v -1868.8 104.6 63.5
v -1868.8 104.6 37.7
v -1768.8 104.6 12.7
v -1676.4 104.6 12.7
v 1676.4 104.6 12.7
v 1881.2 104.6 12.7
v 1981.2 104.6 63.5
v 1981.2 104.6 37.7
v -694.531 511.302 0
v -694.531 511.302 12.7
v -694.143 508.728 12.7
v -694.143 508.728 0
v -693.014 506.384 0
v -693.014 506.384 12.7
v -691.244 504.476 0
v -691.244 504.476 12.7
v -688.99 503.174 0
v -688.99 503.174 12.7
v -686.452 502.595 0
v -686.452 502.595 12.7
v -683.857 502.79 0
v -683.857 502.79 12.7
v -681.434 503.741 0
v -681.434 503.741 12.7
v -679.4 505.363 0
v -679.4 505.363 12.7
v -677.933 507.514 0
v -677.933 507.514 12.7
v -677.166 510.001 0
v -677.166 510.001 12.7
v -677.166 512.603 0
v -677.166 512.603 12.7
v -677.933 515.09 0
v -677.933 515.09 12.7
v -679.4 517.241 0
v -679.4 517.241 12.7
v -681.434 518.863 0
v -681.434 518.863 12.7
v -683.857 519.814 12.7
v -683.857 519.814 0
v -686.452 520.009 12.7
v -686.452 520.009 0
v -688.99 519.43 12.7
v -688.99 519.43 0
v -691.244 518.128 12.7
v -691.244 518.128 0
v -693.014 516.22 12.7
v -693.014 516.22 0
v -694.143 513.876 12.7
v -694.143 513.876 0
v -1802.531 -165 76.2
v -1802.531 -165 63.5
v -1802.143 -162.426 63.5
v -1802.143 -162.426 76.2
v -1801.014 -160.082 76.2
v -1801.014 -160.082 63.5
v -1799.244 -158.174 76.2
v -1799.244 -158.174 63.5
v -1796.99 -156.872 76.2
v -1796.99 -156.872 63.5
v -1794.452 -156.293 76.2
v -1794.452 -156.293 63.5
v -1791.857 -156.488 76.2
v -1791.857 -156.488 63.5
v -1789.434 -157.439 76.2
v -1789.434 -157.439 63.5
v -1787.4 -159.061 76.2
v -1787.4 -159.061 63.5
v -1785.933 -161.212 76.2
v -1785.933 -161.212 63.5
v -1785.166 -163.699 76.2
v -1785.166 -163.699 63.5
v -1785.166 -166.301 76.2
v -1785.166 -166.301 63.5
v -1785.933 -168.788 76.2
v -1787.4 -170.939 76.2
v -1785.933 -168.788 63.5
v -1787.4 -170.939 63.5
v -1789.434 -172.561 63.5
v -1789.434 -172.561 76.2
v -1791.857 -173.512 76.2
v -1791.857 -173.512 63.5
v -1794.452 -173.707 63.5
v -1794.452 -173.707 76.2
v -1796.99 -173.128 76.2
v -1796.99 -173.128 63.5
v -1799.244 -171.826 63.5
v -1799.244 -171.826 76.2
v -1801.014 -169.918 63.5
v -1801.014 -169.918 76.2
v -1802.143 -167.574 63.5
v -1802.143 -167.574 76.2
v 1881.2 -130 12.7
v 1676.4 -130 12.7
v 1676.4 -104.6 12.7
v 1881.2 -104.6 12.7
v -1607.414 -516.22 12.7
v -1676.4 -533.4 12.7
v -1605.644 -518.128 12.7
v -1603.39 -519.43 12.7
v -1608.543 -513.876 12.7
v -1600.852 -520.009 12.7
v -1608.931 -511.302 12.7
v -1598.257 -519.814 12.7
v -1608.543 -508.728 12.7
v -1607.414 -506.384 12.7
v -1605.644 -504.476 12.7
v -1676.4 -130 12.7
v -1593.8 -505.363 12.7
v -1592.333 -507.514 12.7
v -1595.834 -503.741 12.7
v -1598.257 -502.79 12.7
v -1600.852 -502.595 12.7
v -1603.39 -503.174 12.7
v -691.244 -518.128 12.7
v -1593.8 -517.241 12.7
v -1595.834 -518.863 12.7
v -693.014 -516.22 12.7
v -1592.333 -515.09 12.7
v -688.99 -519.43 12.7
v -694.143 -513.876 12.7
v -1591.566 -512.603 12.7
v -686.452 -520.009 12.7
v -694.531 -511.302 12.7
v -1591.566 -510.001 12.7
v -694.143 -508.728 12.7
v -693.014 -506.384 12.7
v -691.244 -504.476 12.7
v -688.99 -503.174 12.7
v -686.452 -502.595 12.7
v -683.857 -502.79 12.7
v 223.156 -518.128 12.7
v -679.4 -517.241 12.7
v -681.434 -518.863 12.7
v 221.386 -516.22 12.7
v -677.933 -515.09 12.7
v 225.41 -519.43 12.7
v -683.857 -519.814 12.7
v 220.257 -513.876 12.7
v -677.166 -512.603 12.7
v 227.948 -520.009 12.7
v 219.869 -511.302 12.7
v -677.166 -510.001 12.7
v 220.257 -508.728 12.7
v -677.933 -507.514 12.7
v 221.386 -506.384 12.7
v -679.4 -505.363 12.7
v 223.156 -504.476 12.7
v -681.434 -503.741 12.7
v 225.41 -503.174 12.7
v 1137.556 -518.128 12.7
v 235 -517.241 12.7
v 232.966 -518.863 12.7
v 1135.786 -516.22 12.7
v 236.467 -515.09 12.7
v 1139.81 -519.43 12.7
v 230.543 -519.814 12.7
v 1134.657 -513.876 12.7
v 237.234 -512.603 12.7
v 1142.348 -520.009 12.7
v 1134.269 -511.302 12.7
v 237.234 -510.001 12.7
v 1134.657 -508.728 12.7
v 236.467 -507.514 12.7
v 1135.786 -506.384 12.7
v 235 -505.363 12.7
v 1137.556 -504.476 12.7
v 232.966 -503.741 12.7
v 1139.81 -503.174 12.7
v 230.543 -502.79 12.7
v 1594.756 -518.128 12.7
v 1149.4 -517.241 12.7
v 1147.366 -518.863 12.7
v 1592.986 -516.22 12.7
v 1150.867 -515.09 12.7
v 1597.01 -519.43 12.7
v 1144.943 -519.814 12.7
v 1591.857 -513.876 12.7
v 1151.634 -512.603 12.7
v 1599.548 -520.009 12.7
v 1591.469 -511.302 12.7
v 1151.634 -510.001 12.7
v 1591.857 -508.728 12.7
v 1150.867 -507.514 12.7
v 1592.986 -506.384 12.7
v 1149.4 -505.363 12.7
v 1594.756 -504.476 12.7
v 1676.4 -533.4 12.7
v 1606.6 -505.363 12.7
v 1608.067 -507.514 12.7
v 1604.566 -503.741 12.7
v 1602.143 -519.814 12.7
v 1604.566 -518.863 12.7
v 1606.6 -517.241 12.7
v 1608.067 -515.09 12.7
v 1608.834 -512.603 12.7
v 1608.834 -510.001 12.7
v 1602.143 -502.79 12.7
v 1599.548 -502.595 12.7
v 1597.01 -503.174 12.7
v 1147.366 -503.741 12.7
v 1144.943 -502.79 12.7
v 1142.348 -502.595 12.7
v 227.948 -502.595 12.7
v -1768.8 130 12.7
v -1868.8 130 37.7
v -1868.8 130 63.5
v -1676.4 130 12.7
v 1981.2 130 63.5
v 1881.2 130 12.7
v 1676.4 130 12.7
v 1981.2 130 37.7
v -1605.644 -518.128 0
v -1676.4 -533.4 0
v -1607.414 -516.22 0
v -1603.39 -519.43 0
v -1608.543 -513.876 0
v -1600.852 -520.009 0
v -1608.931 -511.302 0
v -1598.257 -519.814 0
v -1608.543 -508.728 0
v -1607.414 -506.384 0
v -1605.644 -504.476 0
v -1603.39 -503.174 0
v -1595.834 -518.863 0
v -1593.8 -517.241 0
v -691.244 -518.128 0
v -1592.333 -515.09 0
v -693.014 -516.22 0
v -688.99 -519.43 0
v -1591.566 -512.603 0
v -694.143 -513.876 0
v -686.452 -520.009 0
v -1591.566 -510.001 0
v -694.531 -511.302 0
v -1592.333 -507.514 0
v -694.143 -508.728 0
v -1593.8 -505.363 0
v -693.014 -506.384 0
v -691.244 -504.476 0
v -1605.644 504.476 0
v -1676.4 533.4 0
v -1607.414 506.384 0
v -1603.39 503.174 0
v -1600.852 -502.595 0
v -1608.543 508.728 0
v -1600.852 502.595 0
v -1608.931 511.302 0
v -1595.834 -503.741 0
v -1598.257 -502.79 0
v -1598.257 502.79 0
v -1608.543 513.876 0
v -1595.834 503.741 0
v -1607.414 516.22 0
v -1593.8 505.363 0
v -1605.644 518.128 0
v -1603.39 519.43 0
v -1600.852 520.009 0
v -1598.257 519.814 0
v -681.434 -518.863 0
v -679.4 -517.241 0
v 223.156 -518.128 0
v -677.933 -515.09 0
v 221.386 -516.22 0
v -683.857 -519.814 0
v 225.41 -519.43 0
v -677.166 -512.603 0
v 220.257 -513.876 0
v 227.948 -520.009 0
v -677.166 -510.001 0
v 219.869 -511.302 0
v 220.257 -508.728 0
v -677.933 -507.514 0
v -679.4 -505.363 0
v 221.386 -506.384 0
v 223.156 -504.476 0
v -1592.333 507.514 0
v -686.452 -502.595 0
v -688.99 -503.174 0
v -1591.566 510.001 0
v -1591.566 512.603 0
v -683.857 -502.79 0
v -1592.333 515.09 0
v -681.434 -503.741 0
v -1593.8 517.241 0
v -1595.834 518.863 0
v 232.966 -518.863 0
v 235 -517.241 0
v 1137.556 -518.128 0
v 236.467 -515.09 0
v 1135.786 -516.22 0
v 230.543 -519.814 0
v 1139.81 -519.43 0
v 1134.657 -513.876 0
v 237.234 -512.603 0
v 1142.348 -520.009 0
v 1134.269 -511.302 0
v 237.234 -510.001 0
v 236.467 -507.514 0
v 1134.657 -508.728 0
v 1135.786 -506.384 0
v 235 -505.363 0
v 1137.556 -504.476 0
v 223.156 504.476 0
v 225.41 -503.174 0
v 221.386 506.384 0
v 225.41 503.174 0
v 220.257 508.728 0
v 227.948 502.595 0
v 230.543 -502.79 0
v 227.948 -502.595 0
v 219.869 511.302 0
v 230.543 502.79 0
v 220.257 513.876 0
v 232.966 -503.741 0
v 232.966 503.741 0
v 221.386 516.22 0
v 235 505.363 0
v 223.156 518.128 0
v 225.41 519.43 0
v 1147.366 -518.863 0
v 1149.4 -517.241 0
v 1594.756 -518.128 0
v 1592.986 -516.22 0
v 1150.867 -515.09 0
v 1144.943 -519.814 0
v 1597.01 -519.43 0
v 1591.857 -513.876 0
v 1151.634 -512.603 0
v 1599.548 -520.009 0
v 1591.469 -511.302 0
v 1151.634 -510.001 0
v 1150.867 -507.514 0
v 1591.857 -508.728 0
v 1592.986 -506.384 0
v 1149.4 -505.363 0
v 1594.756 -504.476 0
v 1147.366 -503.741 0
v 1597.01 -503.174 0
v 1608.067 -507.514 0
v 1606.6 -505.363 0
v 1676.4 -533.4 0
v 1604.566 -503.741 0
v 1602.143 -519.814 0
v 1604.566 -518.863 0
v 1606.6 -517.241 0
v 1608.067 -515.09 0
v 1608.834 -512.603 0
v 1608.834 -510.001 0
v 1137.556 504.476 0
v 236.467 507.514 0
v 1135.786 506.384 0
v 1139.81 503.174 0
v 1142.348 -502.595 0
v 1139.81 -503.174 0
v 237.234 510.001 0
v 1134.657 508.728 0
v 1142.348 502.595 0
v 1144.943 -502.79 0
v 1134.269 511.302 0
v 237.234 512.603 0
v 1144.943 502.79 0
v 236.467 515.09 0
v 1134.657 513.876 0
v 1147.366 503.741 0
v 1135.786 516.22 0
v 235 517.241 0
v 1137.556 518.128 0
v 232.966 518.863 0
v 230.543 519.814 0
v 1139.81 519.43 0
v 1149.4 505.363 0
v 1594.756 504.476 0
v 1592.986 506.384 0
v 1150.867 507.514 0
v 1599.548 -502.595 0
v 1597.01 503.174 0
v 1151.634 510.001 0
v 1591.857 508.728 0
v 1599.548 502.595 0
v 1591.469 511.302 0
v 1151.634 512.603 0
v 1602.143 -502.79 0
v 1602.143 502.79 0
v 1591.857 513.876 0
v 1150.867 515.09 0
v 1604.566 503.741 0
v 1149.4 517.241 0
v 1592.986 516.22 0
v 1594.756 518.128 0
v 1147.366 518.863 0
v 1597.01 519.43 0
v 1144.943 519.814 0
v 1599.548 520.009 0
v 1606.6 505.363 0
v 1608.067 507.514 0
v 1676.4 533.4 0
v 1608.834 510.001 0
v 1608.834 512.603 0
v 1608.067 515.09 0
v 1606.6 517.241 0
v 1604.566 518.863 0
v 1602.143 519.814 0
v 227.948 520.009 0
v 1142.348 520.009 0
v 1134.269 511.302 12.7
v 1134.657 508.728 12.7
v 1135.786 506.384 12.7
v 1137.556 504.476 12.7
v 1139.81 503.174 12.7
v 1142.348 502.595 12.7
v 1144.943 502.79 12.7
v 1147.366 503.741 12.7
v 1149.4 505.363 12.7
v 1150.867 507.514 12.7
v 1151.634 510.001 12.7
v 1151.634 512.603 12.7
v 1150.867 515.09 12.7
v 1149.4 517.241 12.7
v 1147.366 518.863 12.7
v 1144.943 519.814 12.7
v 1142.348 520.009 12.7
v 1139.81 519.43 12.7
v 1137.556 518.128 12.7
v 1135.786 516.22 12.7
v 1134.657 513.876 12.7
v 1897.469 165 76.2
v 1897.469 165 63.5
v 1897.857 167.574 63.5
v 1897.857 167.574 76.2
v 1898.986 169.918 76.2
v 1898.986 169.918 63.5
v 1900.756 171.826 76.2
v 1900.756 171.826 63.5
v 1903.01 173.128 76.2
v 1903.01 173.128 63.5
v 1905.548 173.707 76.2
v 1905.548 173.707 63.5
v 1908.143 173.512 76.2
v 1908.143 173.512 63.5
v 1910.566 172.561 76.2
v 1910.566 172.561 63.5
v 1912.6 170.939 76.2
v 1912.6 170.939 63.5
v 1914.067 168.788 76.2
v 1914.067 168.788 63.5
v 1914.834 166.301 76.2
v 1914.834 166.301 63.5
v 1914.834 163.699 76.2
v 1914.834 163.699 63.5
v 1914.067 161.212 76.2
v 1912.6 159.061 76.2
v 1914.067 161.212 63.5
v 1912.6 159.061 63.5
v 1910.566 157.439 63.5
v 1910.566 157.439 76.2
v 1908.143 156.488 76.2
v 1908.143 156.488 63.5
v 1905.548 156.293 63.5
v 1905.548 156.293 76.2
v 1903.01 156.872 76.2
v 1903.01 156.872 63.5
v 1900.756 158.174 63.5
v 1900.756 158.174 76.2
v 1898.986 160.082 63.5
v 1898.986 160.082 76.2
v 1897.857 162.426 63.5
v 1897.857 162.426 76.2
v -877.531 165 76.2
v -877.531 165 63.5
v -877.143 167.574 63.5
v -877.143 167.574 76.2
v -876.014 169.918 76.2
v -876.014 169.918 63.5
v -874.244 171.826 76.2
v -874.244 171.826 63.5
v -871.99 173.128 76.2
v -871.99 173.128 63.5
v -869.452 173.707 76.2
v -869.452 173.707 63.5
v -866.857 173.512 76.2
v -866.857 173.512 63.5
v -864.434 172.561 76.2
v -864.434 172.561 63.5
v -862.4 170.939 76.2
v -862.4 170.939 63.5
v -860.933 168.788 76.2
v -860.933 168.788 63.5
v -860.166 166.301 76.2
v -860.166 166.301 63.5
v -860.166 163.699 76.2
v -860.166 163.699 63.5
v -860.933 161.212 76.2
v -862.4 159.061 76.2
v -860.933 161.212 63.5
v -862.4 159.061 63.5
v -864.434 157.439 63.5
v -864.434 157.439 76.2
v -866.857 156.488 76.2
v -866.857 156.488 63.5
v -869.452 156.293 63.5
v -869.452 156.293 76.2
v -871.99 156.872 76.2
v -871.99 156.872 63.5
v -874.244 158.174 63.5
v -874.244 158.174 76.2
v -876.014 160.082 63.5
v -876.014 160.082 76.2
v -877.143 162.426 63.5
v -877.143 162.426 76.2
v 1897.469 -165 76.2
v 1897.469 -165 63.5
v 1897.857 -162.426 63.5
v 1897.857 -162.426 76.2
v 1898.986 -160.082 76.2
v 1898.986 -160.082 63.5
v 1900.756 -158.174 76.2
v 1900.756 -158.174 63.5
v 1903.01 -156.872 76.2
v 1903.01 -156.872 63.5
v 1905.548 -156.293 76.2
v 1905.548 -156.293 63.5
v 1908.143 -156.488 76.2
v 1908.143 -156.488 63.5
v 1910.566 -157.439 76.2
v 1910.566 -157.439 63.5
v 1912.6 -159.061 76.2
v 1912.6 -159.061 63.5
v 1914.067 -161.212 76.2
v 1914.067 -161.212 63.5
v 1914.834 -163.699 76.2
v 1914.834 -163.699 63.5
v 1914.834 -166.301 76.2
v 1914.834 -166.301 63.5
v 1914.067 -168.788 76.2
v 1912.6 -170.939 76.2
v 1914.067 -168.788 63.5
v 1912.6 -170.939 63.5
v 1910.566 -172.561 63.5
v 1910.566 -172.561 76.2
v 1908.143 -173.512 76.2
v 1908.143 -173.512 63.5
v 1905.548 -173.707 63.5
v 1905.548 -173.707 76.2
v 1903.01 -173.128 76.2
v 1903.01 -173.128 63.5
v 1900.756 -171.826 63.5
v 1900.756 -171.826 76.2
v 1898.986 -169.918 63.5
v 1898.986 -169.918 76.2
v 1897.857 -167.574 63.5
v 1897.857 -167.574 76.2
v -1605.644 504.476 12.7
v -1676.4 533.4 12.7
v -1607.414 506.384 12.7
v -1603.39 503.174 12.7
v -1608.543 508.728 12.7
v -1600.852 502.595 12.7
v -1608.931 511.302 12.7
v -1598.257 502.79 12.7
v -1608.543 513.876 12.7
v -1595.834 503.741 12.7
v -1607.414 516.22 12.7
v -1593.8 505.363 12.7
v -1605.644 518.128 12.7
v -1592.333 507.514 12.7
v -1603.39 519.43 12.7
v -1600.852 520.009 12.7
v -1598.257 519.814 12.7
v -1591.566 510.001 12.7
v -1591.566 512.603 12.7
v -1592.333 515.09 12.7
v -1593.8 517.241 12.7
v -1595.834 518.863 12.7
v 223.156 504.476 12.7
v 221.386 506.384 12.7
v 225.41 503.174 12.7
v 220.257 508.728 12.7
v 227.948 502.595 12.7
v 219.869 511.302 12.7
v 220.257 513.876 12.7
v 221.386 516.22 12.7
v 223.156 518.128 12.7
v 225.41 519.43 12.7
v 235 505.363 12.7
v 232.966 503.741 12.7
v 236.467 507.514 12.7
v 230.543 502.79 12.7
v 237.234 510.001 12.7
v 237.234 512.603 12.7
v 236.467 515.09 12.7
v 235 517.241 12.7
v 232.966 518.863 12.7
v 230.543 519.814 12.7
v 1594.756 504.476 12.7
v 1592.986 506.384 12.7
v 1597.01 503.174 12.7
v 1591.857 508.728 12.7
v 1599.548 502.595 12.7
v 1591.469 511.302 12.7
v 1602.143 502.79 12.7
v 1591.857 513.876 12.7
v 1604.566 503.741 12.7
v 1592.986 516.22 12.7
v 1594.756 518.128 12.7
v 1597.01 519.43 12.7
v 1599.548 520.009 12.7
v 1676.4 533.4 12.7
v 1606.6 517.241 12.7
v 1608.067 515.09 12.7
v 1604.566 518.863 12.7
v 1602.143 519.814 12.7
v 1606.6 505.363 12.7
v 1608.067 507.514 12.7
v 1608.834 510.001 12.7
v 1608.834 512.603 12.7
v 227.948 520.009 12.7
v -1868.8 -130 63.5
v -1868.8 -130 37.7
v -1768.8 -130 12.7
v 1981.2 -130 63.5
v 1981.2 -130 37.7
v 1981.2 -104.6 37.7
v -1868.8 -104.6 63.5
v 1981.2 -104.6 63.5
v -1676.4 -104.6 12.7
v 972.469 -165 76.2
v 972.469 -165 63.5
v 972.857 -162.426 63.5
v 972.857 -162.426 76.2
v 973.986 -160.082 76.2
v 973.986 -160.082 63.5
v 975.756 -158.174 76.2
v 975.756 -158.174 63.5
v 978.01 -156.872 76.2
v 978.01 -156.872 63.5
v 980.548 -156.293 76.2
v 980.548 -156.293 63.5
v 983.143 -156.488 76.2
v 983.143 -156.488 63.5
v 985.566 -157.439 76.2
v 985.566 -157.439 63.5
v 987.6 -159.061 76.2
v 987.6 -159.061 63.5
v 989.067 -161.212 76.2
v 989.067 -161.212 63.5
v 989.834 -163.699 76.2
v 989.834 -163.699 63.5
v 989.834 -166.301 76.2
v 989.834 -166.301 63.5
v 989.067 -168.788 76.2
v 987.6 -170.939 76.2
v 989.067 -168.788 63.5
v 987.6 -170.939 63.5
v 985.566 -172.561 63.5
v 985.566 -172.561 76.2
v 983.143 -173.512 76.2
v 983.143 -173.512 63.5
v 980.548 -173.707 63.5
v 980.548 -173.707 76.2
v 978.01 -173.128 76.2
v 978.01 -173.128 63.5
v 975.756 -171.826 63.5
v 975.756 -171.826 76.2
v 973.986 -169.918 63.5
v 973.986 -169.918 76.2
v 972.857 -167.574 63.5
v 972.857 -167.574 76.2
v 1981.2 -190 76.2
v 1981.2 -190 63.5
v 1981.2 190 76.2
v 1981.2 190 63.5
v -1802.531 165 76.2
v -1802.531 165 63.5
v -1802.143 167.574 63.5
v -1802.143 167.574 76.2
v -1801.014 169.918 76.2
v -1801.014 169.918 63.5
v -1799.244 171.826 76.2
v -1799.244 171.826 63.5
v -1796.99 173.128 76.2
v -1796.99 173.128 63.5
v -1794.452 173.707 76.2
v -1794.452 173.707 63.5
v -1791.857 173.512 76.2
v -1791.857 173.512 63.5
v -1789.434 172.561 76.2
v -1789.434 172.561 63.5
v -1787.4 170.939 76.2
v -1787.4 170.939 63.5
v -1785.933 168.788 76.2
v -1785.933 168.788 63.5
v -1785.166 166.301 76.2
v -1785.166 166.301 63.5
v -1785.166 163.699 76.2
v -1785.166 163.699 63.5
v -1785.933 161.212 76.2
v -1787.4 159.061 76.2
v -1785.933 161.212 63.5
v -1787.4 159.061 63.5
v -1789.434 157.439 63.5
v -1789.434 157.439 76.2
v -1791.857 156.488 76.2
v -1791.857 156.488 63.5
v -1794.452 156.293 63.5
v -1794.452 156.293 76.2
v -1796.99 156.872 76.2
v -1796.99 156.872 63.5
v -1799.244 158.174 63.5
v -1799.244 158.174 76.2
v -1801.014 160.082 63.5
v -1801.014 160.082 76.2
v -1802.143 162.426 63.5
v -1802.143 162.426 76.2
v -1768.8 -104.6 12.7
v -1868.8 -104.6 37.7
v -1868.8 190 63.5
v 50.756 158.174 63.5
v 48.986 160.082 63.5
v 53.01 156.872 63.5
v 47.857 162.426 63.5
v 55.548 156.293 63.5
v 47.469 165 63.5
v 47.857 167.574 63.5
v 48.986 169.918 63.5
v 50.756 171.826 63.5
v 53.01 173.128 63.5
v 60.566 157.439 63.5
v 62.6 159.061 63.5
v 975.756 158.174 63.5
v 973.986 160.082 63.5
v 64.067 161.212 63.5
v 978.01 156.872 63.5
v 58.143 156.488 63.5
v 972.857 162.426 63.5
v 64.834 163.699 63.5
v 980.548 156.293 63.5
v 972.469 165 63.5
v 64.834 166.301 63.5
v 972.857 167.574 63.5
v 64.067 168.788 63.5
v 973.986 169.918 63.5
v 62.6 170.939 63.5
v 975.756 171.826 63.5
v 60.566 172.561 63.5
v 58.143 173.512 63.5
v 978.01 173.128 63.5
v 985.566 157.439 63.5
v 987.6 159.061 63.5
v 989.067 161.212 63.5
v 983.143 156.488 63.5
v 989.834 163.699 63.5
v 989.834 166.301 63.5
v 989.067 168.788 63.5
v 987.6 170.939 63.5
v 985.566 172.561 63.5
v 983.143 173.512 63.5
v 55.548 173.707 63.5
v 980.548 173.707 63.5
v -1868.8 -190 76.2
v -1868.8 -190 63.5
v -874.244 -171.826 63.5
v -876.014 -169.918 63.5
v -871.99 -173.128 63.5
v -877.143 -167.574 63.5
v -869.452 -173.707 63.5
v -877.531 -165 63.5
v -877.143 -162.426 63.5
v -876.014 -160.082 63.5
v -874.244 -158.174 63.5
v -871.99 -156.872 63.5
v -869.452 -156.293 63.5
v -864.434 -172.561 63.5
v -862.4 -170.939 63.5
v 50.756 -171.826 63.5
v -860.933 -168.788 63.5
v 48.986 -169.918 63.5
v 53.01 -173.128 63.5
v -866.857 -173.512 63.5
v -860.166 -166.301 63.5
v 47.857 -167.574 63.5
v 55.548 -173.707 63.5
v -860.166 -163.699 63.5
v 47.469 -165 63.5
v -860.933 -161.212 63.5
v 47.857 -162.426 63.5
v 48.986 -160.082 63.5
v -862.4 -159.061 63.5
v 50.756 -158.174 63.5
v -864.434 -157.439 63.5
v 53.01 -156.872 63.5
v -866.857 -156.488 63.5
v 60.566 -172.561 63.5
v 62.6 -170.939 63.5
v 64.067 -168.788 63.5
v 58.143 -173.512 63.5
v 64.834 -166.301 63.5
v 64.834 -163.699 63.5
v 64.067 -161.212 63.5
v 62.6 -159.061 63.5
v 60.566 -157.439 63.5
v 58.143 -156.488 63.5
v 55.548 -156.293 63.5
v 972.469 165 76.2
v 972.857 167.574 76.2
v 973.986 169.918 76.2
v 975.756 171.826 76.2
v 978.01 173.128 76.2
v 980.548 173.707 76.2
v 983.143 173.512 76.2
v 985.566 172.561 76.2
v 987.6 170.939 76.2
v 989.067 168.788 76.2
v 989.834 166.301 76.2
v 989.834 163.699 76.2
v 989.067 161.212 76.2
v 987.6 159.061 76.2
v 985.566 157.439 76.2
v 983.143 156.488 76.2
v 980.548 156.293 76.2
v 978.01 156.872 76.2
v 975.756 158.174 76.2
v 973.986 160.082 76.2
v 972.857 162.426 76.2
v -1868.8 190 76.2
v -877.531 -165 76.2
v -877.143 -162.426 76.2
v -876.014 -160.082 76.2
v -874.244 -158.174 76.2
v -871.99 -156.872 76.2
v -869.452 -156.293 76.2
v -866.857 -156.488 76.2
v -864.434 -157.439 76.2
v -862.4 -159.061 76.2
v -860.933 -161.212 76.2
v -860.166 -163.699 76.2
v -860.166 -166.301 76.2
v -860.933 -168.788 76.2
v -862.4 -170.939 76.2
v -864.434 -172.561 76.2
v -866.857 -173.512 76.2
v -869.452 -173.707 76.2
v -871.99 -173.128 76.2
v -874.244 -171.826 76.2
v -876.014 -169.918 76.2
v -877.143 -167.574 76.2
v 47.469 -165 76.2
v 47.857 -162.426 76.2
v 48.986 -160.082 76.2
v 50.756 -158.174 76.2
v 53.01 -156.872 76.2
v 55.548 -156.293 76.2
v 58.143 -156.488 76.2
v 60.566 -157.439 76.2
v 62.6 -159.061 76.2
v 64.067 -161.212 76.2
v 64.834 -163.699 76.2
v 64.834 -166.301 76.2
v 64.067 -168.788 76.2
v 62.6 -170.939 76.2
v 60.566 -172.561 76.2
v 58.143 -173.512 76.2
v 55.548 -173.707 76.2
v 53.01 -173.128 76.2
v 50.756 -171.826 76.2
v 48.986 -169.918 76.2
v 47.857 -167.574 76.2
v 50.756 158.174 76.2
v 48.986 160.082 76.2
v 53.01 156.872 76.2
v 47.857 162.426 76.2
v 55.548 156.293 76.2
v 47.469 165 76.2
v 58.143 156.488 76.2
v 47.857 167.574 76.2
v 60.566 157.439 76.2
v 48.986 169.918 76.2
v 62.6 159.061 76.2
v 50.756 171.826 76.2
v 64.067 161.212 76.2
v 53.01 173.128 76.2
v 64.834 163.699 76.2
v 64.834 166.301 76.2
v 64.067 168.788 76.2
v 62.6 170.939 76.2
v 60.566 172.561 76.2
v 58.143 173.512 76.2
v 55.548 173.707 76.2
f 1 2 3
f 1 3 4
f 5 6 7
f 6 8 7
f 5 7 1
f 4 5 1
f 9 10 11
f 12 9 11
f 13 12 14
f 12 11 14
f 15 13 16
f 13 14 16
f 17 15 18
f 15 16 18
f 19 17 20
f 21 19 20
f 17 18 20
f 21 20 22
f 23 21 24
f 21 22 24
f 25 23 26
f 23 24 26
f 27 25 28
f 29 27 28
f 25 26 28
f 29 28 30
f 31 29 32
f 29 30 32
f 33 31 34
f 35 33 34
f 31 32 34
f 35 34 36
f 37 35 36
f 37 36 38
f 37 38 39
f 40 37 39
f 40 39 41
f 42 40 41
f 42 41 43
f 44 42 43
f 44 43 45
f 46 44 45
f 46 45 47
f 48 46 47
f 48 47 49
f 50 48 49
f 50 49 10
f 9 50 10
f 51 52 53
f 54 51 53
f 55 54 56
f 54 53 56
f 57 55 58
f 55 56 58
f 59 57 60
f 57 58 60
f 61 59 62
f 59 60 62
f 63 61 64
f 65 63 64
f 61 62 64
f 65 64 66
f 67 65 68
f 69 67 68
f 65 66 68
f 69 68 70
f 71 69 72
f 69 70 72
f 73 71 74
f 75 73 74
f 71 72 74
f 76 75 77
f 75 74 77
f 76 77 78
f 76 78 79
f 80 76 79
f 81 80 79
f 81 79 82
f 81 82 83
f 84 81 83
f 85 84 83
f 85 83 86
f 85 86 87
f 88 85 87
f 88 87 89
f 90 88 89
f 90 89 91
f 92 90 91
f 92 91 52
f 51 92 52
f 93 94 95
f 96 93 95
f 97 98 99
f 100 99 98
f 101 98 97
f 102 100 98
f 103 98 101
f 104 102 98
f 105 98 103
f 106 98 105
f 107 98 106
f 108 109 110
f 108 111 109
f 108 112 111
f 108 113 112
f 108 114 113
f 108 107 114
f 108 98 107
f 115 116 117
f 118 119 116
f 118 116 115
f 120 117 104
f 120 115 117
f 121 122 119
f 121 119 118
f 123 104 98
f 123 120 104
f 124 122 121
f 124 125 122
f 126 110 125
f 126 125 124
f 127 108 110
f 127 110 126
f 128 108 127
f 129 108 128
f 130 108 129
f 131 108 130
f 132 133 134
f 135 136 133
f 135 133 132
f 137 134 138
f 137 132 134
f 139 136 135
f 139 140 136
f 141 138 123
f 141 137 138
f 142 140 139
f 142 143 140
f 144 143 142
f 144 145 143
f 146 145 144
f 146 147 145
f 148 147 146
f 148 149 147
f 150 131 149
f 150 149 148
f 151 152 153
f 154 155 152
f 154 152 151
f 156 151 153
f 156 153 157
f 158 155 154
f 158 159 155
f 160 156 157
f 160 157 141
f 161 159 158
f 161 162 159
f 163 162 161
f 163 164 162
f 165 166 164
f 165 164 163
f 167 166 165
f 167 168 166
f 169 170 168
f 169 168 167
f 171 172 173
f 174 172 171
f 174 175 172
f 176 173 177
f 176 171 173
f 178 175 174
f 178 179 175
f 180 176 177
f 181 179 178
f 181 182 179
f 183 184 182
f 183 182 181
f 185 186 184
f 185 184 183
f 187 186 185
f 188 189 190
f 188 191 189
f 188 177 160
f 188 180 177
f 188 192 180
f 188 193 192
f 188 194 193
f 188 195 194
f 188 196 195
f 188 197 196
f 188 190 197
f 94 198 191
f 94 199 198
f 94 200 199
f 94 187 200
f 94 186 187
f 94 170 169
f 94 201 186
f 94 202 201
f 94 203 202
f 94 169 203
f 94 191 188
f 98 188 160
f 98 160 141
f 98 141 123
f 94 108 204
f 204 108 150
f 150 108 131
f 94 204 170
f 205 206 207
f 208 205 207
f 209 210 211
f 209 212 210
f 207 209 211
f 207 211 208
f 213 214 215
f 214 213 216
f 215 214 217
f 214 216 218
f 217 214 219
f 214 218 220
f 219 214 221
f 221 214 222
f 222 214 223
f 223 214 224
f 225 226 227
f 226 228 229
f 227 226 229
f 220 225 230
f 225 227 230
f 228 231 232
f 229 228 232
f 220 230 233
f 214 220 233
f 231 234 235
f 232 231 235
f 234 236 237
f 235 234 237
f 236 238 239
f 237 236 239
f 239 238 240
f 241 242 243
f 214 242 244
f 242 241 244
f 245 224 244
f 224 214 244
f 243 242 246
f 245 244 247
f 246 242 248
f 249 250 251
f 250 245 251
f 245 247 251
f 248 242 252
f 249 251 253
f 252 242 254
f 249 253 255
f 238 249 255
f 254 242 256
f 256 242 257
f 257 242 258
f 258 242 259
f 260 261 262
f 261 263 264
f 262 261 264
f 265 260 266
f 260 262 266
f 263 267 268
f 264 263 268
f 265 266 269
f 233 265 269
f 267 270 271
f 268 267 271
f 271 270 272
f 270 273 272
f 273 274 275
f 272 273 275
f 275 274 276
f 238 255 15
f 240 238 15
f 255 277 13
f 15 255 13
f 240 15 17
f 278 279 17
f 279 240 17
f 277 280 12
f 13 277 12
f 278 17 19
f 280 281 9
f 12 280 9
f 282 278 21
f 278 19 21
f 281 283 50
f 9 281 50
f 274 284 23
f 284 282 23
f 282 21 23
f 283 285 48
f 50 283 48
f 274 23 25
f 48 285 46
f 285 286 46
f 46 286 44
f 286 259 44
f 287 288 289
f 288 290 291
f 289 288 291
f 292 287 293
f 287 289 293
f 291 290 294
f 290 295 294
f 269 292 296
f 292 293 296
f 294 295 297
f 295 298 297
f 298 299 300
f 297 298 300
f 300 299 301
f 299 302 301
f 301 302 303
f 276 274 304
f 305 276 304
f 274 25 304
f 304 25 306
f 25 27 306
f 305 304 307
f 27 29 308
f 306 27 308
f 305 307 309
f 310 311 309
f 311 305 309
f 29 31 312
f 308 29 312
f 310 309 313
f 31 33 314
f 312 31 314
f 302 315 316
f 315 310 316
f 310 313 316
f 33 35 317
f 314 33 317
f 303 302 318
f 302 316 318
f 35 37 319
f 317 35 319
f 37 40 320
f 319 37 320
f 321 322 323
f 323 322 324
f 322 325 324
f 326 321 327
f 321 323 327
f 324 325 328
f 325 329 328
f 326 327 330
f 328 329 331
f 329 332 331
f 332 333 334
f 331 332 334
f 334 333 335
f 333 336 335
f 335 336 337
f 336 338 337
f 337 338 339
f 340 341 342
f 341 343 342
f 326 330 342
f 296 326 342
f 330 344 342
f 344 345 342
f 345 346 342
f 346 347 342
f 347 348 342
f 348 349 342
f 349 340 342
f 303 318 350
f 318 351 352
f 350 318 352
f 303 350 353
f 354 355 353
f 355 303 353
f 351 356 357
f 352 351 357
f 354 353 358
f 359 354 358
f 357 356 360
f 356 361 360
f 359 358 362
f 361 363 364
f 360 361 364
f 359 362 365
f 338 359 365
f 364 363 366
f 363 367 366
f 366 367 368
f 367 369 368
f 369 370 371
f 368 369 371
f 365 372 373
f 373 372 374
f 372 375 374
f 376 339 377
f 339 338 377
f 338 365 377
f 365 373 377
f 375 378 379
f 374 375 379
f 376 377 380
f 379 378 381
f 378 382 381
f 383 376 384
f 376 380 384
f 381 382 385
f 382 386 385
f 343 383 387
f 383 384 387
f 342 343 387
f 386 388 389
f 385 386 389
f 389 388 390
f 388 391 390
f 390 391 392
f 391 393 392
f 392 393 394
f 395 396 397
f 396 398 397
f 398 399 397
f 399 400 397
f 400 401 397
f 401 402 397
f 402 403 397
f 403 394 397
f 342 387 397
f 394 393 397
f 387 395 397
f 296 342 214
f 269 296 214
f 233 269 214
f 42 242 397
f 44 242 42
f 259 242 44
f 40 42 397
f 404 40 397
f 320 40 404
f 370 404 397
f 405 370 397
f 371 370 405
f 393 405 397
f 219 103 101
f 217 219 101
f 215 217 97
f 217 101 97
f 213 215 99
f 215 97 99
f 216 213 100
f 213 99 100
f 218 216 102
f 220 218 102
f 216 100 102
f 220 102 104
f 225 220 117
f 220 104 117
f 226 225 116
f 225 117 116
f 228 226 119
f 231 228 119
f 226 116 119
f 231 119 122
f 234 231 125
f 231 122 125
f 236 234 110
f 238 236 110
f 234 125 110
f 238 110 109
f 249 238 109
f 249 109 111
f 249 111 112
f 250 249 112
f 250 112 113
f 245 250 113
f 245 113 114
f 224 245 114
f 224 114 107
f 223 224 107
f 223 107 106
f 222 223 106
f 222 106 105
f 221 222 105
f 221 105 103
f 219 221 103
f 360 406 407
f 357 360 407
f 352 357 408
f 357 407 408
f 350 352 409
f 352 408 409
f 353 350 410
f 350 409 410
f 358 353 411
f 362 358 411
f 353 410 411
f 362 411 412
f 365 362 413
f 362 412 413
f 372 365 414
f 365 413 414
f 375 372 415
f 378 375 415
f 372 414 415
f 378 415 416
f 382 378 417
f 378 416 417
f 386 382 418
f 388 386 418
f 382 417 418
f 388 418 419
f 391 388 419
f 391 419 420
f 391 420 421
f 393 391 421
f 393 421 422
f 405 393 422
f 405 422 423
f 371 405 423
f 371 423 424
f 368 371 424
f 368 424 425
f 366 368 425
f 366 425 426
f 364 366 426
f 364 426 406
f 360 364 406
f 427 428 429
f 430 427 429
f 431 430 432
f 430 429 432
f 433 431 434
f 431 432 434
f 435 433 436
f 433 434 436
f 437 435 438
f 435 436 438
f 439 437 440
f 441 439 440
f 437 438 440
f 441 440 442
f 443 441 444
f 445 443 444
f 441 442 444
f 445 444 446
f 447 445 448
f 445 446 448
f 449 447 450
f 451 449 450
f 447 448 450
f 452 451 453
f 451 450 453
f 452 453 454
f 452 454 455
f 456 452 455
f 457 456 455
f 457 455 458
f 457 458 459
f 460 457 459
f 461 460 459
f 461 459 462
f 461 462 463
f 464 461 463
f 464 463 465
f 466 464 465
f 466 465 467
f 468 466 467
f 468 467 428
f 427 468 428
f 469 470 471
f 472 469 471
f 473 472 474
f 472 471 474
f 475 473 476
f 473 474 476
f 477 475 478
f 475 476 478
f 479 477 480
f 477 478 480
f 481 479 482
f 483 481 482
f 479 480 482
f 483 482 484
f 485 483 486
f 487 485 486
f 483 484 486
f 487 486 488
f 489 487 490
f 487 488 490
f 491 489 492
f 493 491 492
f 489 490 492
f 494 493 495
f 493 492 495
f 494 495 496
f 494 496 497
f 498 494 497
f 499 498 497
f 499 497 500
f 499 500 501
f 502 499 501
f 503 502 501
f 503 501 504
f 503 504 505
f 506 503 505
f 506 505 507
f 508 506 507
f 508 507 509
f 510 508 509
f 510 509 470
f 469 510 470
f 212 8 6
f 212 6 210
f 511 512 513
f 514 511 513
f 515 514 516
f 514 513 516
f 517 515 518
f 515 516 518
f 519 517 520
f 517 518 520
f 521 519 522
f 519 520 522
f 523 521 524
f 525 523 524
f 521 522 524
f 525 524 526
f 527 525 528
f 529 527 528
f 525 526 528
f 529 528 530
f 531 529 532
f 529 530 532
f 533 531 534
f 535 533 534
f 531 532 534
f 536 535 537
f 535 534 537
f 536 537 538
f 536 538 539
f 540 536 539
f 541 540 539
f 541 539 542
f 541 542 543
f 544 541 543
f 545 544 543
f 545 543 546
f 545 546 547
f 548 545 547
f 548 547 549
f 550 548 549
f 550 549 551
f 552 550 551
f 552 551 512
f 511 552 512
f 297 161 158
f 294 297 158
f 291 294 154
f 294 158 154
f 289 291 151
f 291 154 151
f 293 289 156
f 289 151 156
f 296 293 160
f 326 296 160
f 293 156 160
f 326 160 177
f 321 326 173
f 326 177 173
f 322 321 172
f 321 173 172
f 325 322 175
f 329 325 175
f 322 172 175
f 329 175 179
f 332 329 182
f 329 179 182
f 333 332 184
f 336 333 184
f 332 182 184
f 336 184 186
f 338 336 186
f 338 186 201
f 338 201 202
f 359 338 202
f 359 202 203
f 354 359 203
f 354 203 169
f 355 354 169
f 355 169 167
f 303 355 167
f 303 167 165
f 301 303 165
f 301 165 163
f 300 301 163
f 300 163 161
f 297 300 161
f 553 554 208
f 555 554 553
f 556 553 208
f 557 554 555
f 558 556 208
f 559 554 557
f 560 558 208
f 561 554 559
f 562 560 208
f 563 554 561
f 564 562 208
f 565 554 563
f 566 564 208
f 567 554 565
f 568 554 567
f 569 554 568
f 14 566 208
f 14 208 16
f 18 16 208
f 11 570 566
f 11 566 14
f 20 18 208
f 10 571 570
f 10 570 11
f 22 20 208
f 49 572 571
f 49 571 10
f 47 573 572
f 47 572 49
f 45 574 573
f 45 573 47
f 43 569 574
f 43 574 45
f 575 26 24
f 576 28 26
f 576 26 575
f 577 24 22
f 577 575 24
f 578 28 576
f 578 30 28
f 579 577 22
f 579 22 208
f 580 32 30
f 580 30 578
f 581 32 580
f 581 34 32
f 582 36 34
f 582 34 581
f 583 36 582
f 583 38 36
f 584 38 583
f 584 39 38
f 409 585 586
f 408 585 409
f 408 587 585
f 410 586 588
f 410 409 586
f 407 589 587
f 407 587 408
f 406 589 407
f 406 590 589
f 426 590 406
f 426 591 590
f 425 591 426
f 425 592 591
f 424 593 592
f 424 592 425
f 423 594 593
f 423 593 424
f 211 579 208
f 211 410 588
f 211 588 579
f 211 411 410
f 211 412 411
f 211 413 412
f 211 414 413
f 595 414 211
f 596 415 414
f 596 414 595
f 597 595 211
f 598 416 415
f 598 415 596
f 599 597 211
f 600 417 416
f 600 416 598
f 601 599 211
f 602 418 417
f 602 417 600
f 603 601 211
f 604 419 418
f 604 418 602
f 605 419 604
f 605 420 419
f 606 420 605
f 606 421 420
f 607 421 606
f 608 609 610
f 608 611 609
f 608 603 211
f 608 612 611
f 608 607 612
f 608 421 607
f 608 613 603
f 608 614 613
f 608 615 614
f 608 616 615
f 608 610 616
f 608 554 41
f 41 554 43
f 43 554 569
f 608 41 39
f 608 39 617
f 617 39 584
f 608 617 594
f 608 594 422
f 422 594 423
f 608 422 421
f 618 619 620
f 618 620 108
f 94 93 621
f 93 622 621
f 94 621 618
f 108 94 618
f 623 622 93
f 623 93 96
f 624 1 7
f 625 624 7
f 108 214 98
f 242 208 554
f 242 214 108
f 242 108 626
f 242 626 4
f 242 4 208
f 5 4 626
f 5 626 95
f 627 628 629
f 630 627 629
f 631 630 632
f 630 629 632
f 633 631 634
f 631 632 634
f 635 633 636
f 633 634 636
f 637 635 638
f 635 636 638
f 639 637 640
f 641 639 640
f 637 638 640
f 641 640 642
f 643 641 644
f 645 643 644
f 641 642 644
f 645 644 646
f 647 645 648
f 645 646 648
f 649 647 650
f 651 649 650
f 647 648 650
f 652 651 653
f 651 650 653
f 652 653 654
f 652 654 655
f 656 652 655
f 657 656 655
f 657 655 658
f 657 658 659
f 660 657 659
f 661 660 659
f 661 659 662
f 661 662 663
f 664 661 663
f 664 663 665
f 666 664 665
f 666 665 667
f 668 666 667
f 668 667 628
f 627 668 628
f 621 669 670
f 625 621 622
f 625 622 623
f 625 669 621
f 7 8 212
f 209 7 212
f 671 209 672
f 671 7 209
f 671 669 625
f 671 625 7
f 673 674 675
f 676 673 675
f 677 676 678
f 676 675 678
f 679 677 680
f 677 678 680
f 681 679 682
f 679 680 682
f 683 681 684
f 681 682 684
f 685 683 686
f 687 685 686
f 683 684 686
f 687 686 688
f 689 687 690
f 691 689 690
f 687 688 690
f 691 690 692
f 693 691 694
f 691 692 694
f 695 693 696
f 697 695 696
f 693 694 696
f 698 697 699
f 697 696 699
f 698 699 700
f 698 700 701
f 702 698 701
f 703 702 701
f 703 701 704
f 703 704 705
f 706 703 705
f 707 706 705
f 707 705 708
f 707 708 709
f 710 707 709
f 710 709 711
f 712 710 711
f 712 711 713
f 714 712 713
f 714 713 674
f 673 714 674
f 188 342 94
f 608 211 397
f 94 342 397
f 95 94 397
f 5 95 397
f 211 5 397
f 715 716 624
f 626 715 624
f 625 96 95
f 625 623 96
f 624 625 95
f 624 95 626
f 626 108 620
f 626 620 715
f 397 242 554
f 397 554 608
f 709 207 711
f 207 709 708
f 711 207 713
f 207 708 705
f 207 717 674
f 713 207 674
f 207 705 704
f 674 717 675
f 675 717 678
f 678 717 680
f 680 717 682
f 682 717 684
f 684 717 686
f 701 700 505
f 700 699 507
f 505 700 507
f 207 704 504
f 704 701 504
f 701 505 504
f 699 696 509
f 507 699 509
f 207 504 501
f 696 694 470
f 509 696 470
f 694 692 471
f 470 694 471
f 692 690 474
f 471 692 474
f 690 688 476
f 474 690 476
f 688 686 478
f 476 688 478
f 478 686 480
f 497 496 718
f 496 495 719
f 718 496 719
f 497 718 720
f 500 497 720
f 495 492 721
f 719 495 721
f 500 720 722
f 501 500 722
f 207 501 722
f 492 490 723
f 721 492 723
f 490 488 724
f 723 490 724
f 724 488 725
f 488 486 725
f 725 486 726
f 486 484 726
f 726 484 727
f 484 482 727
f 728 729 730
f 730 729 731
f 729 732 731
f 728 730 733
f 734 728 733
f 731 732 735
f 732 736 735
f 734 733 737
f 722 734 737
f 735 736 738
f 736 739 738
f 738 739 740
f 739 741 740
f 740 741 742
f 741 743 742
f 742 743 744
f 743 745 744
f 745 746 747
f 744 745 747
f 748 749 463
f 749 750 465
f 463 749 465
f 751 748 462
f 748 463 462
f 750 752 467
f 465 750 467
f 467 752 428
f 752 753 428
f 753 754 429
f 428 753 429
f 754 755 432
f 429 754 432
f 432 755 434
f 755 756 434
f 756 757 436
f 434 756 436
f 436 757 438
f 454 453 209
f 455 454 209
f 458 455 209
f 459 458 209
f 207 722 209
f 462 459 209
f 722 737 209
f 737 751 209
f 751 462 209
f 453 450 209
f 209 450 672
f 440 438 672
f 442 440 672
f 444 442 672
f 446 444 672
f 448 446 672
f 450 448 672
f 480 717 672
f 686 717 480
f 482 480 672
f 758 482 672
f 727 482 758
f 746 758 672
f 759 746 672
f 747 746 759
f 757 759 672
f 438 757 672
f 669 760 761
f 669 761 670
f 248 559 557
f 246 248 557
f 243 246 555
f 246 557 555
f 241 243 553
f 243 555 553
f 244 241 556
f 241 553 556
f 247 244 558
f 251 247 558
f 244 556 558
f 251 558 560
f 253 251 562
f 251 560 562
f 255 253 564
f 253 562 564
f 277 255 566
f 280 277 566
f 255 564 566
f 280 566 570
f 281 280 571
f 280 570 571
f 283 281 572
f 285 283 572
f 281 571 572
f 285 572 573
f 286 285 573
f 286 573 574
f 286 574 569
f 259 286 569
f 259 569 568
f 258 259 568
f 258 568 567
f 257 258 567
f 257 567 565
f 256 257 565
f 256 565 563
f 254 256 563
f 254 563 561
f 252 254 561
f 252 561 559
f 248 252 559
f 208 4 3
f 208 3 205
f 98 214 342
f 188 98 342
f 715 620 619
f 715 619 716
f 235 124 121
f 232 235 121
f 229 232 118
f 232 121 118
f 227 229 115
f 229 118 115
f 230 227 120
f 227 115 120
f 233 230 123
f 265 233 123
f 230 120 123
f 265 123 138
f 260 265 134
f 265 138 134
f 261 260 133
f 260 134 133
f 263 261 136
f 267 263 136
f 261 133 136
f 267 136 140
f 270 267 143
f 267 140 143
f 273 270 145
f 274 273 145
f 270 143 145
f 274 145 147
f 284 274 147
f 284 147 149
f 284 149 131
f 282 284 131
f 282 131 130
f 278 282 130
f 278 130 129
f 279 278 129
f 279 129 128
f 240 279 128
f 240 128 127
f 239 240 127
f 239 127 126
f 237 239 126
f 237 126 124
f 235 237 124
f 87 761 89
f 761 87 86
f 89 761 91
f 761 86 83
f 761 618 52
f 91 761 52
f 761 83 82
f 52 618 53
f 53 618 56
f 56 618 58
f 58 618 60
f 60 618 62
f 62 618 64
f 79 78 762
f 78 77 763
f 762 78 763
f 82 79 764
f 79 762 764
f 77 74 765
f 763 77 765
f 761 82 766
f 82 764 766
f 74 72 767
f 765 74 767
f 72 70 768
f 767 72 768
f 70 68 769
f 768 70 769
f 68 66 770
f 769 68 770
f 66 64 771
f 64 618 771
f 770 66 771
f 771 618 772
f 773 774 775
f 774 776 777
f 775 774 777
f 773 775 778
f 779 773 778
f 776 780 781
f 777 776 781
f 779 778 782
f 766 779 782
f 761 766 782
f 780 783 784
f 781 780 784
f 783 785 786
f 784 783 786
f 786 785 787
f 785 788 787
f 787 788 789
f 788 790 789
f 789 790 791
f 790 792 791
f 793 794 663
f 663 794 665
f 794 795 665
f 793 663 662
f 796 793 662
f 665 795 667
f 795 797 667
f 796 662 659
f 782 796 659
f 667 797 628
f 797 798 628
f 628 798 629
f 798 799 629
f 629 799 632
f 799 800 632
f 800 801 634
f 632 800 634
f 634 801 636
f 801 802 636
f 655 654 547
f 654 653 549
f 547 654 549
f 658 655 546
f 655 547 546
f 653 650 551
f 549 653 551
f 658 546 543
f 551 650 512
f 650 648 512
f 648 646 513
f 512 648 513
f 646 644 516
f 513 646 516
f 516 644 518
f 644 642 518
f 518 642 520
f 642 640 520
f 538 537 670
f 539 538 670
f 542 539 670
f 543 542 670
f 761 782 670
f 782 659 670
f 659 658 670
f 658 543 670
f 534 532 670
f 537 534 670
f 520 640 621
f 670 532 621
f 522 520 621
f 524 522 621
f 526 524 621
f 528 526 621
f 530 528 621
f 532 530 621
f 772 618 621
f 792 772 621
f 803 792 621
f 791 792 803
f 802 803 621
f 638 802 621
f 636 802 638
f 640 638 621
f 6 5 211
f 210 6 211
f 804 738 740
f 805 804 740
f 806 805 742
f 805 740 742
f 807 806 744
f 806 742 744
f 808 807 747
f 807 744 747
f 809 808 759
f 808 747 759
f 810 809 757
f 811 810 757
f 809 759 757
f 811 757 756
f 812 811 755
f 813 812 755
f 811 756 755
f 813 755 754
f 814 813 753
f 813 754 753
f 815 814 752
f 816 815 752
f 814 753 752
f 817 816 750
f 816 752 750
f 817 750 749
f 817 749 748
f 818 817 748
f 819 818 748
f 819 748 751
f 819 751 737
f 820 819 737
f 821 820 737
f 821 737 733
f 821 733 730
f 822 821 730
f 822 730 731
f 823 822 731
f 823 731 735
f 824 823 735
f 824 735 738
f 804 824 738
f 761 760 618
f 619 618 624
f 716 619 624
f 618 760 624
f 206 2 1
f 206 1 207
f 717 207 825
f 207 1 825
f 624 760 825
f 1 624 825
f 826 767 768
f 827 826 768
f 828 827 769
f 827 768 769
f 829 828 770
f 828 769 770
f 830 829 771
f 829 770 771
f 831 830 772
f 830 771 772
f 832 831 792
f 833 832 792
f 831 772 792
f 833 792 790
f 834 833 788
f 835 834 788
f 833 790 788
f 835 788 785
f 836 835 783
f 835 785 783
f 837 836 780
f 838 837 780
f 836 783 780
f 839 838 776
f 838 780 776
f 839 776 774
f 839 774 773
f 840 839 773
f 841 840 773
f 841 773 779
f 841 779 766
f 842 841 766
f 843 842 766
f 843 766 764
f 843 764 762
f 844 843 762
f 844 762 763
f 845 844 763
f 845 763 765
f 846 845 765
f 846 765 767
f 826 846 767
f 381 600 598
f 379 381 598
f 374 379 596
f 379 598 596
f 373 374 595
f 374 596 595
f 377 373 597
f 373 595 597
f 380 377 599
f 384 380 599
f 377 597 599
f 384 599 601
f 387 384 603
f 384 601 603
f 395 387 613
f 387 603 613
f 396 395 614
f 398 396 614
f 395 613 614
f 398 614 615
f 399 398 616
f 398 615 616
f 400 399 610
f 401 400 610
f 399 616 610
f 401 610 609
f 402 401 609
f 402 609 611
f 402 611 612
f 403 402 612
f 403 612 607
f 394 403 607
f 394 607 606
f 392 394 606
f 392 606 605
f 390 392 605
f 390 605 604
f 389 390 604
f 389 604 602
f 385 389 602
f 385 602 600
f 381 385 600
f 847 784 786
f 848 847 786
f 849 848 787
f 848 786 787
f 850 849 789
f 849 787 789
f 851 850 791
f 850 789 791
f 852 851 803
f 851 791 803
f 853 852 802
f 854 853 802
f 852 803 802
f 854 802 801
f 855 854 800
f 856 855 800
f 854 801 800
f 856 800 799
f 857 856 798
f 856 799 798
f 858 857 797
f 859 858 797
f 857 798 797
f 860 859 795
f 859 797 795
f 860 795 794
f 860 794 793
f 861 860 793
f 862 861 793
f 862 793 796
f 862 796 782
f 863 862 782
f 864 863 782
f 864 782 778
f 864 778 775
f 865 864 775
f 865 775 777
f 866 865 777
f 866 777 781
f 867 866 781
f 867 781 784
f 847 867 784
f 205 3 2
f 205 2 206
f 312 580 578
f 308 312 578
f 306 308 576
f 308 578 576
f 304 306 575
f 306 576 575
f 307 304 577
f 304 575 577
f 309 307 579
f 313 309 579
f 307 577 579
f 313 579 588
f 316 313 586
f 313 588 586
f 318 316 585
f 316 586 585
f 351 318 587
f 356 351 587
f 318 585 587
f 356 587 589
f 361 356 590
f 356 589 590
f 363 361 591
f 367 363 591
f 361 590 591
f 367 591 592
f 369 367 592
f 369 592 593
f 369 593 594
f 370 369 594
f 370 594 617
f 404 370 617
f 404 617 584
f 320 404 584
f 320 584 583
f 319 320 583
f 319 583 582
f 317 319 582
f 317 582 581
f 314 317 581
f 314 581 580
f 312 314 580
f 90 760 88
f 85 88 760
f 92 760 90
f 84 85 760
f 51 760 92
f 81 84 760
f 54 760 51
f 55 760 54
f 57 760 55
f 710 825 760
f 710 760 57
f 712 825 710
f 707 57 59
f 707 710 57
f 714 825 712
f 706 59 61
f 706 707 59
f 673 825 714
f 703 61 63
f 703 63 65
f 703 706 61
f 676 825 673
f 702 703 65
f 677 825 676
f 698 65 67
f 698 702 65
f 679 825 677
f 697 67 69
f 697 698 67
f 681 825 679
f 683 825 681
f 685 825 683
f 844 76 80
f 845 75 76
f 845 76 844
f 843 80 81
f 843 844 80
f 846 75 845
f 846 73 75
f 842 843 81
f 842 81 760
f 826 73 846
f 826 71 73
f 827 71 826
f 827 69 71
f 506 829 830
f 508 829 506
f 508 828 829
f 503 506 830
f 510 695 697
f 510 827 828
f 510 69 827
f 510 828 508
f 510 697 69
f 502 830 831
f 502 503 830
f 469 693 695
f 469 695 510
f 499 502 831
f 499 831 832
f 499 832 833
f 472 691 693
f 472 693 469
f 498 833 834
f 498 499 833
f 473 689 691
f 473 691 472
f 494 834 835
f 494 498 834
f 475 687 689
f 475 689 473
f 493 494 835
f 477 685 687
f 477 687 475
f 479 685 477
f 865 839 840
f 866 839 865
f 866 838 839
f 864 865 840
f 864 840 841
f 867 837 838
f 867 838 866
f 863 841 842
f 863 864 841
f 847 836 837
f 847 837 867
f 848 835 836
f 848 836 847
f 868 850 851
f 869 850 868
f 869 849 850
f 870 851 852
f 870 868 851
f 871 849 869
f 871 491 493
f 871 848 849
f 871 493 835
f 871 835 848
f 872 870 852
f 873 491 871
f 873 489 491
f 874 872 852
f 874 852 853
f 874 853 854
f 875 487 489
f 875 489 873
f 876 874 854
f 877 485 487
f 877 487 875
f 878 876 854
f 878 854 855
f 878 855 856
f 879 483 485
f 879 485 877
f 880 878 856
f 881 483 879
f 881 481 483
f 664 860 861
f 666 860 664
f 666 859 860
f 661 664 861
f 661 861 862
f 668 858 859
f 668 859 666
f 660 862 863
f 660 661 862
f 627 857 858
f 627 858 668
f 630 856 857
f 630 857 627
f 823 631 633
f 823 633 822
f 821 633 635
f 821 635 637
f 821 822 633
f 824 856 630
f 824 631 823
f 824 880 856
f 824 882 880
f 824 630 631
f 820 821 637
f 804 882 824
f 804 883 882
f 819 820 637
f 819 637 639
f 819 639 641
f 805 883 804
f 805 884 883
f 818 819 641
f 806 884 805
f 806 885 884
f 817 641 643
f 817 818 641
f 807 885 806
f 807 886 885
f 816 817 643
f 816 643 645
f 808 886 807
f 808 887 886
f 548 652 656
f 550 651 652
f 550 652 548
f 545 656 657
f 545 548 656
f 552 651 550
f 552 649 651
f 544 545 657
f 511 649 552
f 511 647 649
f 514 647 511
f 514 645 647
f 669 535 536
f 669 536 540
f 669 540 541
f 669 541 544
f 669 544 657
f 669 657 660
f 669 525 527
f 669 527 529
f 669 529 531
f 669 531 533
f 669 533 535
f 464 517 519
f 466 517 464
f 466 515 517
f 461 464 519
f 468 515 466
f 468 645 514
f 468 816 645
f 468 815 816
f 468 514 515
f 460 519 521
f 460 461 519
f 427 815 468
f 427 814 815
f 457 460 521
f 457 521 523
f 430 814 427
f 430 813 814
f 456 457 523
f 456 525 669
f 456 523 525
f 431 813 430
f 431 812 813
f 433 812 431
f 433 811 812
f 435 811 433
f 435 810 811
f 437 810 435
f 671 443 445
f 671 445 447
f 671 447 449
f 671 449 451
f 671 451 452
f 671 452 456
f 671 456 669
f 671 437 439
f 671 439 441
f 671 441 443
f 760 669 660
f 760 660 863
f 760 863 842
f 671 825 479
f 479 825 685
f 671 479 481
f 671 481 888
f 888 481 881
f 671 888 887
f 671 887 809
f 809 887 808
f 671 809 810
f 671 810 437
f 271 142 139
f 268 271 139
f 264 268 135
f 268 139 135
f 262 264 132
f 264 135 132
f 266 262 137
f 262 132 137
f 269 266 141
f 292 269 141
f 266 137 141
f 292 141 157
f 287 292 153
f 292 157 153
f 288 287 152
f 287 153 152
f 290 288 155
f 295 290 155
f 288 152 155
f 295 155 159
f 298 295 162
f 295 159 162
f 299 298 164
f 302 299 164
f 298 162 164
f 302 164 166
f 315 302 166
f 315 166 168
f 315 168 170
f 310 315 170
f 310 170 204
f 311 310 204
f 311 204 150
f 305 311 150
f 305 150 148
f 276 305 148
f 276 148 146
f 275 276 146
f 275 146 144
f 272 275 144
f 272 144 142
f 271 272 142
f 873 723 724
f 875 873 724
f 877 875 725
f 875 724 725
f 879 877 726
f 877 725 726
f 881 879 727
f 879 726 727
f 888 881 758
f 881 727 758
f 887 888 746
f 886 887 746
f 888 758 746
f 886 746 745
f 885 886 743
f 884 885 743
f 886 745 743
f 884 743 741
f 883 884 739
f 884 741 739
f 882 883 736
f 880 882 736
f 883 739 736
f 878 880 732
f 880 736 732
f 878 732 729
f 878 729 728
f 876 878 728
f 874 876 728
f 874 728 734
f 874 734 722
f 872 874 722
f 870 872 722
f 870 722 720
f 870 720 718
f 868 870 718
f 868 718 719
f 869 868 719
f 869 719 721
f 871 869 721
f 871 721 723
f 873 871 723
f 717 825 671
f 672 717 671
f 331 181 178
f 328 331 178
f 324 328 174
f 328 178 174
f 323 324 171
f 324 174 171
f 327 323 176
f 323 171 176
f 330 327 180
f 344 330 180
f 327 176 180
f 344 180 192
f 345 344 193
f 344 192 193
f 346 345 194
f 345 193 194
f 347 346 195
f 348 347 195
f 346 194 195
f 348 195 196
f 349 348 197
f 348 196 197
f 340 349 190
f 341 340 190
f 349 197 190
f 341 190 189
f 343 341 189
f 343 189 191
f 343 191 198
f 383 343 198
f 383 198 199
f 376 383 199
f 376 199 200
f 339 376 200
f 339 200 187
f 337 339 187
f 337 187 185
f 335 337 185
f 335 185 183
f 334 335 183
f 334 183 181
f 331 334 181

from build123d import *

# Parameters (mm, degrees)
F0_W      = 3352.8
F0_H      = 1066.8
F1_DEPTH  = 12.7
F2_D      = 17.4625
F2_DEPTH  = 50.8
F2_TIP    = 5.2462642799
F4_W      = 3850
F4_H      = 380
F5_DEPTH  = 12.7
F7_D      = 17.4625
F8_W      = 25.4
F8_H      = 50.8
F9_DEPTH  = 3850
F10_SIZE2 = 100
F10_SIZE  = 25
F11_SIZE2 = 100
F11_SIZE  = 25
F12_SIZE2 = 100
F12_SIZE  = 25
F13_SIZE2 = 100
F13_SIZE  = 25


# Not quite as in the source:
# - a length typed as a fraction of an inch, garbled in the dataset ("3 / 203.2 mm" for 3/8 in), is restored


with BuildPart() as f1:
    # F0 (on Top) → F1 (new body)
    with BuildSketch(Plane.XY):
        Rectangle(F0_W, F0_H)
    extrude(amount=F1_DEPTH)

    # F2
    with Locations(Plane(origin=(0, 0, 0), x_dir=(1, 0, 0), z_dir=(0, 0, -1))):
        with Locations((-1600.2, -511.302), (-685.8, -511.302), (228.6, -511.302), (1143, -511.302), (1600.2, -511.302), (1600.2, 511.302), (1143, 511.302), (228.6, 511.302), (-685.8, 511.302), (-1600.2, 511.302)):
            Hole(F2_D / 2, depth=F2_DEPTH)
            with Locations((0, 0, -(F2_DEPTH + F2_TIP / 2))):  # 118° drill point
                Cone(0, F2_D / 2, F2_TIP, mode=Mode.SUBTRACT)



with BuildPart() as f5:
    # F4 (on offset) → F5 (new body)
    with BuildSketch(Plane.XY.offset(76.2)):
        with Locations((56.2, 0)):
            Rectangle(F4_W, F4_H)
    extrude(amount=-F5_DEPTH)

    # F7 (through all)
    with Locations(Plane.XY.offset(76.2)):
        with Locations((-1793.8, 165), (-1793.8, -165), (-868.8, 165), (-868.8, -165), (56.2, 165), (981.2, 165), (56.2, -165), (981.2, -165), (1906.2, 165), (1906.2, -165)):
            Hole(F7_D / 2)


with BuildPart() as f1_1:
    add(f1.part)

    add(f5.part)  # F9 merges F5
    # F8 (on face) → F9 (join)
    with BuildSketch(Plane.YZ.offset(1981.2)):
        with Locations((-117.3, 38.1)):
            Rectangle(F8_W, F8_H)
        with Locations((117.3, 38.1)):
            Rectangle(F8_W, F8_H)
    extrude(amount=-F9_DEPTH)

    # F10
    f10_edges = [f1_1.edges().sort_by_distance(p)[0] for p in [
        (-1868.8, 117.3, 12.7),
    ]]
    f10_side = f1_1.faces().sort_by_distance((-1868.8, 186.147309, 69.85))[0]
    chamfer(f10_edges, length=F10_SIZE, length2=F10_SIZE2, reference=f10_side)

    # F11
    f11_edges = [f1_1.edges().sort_by_distance(p)[0] for p in [
        (-1868.8, -117.3, 12.7),
    ]]
    f11_side = f1_1.faces().sort_by_distance((-1868.8, 126.147309, 50.6))[0]
    chamfer(f11_edges, length=F11_SIZE, length2=F11_SIZE2, reference=f11_side)

    # F12
    f12_edges = [f1_1.edges().sort_by_distance(p)[0] for p in [
        (1981.2, 117.3, 12.7),
    ]]
    f12_side = f1_1.faces().sort_by_distance((1981.2, -186.147309, 69.85))[0]
    chamfer(f12_edges, length=F12_SIZE, length2=F12_SIZE2, reference=f12_side)

    # F13
    f13_edges = [f1_1.edges().sort_by_distance(p)[0] for p in [
        (1981.2, -117.3, 12.7),
    ]]
    f13_side = f1_1.faces().sort_by_distance((1981.2, 108.452691, 50.6))[0]
    chamfer(f13_edges, length=F13_SIZE, length2=F13_SIZE2, reference=f13_side)


solid = f1_1.part
